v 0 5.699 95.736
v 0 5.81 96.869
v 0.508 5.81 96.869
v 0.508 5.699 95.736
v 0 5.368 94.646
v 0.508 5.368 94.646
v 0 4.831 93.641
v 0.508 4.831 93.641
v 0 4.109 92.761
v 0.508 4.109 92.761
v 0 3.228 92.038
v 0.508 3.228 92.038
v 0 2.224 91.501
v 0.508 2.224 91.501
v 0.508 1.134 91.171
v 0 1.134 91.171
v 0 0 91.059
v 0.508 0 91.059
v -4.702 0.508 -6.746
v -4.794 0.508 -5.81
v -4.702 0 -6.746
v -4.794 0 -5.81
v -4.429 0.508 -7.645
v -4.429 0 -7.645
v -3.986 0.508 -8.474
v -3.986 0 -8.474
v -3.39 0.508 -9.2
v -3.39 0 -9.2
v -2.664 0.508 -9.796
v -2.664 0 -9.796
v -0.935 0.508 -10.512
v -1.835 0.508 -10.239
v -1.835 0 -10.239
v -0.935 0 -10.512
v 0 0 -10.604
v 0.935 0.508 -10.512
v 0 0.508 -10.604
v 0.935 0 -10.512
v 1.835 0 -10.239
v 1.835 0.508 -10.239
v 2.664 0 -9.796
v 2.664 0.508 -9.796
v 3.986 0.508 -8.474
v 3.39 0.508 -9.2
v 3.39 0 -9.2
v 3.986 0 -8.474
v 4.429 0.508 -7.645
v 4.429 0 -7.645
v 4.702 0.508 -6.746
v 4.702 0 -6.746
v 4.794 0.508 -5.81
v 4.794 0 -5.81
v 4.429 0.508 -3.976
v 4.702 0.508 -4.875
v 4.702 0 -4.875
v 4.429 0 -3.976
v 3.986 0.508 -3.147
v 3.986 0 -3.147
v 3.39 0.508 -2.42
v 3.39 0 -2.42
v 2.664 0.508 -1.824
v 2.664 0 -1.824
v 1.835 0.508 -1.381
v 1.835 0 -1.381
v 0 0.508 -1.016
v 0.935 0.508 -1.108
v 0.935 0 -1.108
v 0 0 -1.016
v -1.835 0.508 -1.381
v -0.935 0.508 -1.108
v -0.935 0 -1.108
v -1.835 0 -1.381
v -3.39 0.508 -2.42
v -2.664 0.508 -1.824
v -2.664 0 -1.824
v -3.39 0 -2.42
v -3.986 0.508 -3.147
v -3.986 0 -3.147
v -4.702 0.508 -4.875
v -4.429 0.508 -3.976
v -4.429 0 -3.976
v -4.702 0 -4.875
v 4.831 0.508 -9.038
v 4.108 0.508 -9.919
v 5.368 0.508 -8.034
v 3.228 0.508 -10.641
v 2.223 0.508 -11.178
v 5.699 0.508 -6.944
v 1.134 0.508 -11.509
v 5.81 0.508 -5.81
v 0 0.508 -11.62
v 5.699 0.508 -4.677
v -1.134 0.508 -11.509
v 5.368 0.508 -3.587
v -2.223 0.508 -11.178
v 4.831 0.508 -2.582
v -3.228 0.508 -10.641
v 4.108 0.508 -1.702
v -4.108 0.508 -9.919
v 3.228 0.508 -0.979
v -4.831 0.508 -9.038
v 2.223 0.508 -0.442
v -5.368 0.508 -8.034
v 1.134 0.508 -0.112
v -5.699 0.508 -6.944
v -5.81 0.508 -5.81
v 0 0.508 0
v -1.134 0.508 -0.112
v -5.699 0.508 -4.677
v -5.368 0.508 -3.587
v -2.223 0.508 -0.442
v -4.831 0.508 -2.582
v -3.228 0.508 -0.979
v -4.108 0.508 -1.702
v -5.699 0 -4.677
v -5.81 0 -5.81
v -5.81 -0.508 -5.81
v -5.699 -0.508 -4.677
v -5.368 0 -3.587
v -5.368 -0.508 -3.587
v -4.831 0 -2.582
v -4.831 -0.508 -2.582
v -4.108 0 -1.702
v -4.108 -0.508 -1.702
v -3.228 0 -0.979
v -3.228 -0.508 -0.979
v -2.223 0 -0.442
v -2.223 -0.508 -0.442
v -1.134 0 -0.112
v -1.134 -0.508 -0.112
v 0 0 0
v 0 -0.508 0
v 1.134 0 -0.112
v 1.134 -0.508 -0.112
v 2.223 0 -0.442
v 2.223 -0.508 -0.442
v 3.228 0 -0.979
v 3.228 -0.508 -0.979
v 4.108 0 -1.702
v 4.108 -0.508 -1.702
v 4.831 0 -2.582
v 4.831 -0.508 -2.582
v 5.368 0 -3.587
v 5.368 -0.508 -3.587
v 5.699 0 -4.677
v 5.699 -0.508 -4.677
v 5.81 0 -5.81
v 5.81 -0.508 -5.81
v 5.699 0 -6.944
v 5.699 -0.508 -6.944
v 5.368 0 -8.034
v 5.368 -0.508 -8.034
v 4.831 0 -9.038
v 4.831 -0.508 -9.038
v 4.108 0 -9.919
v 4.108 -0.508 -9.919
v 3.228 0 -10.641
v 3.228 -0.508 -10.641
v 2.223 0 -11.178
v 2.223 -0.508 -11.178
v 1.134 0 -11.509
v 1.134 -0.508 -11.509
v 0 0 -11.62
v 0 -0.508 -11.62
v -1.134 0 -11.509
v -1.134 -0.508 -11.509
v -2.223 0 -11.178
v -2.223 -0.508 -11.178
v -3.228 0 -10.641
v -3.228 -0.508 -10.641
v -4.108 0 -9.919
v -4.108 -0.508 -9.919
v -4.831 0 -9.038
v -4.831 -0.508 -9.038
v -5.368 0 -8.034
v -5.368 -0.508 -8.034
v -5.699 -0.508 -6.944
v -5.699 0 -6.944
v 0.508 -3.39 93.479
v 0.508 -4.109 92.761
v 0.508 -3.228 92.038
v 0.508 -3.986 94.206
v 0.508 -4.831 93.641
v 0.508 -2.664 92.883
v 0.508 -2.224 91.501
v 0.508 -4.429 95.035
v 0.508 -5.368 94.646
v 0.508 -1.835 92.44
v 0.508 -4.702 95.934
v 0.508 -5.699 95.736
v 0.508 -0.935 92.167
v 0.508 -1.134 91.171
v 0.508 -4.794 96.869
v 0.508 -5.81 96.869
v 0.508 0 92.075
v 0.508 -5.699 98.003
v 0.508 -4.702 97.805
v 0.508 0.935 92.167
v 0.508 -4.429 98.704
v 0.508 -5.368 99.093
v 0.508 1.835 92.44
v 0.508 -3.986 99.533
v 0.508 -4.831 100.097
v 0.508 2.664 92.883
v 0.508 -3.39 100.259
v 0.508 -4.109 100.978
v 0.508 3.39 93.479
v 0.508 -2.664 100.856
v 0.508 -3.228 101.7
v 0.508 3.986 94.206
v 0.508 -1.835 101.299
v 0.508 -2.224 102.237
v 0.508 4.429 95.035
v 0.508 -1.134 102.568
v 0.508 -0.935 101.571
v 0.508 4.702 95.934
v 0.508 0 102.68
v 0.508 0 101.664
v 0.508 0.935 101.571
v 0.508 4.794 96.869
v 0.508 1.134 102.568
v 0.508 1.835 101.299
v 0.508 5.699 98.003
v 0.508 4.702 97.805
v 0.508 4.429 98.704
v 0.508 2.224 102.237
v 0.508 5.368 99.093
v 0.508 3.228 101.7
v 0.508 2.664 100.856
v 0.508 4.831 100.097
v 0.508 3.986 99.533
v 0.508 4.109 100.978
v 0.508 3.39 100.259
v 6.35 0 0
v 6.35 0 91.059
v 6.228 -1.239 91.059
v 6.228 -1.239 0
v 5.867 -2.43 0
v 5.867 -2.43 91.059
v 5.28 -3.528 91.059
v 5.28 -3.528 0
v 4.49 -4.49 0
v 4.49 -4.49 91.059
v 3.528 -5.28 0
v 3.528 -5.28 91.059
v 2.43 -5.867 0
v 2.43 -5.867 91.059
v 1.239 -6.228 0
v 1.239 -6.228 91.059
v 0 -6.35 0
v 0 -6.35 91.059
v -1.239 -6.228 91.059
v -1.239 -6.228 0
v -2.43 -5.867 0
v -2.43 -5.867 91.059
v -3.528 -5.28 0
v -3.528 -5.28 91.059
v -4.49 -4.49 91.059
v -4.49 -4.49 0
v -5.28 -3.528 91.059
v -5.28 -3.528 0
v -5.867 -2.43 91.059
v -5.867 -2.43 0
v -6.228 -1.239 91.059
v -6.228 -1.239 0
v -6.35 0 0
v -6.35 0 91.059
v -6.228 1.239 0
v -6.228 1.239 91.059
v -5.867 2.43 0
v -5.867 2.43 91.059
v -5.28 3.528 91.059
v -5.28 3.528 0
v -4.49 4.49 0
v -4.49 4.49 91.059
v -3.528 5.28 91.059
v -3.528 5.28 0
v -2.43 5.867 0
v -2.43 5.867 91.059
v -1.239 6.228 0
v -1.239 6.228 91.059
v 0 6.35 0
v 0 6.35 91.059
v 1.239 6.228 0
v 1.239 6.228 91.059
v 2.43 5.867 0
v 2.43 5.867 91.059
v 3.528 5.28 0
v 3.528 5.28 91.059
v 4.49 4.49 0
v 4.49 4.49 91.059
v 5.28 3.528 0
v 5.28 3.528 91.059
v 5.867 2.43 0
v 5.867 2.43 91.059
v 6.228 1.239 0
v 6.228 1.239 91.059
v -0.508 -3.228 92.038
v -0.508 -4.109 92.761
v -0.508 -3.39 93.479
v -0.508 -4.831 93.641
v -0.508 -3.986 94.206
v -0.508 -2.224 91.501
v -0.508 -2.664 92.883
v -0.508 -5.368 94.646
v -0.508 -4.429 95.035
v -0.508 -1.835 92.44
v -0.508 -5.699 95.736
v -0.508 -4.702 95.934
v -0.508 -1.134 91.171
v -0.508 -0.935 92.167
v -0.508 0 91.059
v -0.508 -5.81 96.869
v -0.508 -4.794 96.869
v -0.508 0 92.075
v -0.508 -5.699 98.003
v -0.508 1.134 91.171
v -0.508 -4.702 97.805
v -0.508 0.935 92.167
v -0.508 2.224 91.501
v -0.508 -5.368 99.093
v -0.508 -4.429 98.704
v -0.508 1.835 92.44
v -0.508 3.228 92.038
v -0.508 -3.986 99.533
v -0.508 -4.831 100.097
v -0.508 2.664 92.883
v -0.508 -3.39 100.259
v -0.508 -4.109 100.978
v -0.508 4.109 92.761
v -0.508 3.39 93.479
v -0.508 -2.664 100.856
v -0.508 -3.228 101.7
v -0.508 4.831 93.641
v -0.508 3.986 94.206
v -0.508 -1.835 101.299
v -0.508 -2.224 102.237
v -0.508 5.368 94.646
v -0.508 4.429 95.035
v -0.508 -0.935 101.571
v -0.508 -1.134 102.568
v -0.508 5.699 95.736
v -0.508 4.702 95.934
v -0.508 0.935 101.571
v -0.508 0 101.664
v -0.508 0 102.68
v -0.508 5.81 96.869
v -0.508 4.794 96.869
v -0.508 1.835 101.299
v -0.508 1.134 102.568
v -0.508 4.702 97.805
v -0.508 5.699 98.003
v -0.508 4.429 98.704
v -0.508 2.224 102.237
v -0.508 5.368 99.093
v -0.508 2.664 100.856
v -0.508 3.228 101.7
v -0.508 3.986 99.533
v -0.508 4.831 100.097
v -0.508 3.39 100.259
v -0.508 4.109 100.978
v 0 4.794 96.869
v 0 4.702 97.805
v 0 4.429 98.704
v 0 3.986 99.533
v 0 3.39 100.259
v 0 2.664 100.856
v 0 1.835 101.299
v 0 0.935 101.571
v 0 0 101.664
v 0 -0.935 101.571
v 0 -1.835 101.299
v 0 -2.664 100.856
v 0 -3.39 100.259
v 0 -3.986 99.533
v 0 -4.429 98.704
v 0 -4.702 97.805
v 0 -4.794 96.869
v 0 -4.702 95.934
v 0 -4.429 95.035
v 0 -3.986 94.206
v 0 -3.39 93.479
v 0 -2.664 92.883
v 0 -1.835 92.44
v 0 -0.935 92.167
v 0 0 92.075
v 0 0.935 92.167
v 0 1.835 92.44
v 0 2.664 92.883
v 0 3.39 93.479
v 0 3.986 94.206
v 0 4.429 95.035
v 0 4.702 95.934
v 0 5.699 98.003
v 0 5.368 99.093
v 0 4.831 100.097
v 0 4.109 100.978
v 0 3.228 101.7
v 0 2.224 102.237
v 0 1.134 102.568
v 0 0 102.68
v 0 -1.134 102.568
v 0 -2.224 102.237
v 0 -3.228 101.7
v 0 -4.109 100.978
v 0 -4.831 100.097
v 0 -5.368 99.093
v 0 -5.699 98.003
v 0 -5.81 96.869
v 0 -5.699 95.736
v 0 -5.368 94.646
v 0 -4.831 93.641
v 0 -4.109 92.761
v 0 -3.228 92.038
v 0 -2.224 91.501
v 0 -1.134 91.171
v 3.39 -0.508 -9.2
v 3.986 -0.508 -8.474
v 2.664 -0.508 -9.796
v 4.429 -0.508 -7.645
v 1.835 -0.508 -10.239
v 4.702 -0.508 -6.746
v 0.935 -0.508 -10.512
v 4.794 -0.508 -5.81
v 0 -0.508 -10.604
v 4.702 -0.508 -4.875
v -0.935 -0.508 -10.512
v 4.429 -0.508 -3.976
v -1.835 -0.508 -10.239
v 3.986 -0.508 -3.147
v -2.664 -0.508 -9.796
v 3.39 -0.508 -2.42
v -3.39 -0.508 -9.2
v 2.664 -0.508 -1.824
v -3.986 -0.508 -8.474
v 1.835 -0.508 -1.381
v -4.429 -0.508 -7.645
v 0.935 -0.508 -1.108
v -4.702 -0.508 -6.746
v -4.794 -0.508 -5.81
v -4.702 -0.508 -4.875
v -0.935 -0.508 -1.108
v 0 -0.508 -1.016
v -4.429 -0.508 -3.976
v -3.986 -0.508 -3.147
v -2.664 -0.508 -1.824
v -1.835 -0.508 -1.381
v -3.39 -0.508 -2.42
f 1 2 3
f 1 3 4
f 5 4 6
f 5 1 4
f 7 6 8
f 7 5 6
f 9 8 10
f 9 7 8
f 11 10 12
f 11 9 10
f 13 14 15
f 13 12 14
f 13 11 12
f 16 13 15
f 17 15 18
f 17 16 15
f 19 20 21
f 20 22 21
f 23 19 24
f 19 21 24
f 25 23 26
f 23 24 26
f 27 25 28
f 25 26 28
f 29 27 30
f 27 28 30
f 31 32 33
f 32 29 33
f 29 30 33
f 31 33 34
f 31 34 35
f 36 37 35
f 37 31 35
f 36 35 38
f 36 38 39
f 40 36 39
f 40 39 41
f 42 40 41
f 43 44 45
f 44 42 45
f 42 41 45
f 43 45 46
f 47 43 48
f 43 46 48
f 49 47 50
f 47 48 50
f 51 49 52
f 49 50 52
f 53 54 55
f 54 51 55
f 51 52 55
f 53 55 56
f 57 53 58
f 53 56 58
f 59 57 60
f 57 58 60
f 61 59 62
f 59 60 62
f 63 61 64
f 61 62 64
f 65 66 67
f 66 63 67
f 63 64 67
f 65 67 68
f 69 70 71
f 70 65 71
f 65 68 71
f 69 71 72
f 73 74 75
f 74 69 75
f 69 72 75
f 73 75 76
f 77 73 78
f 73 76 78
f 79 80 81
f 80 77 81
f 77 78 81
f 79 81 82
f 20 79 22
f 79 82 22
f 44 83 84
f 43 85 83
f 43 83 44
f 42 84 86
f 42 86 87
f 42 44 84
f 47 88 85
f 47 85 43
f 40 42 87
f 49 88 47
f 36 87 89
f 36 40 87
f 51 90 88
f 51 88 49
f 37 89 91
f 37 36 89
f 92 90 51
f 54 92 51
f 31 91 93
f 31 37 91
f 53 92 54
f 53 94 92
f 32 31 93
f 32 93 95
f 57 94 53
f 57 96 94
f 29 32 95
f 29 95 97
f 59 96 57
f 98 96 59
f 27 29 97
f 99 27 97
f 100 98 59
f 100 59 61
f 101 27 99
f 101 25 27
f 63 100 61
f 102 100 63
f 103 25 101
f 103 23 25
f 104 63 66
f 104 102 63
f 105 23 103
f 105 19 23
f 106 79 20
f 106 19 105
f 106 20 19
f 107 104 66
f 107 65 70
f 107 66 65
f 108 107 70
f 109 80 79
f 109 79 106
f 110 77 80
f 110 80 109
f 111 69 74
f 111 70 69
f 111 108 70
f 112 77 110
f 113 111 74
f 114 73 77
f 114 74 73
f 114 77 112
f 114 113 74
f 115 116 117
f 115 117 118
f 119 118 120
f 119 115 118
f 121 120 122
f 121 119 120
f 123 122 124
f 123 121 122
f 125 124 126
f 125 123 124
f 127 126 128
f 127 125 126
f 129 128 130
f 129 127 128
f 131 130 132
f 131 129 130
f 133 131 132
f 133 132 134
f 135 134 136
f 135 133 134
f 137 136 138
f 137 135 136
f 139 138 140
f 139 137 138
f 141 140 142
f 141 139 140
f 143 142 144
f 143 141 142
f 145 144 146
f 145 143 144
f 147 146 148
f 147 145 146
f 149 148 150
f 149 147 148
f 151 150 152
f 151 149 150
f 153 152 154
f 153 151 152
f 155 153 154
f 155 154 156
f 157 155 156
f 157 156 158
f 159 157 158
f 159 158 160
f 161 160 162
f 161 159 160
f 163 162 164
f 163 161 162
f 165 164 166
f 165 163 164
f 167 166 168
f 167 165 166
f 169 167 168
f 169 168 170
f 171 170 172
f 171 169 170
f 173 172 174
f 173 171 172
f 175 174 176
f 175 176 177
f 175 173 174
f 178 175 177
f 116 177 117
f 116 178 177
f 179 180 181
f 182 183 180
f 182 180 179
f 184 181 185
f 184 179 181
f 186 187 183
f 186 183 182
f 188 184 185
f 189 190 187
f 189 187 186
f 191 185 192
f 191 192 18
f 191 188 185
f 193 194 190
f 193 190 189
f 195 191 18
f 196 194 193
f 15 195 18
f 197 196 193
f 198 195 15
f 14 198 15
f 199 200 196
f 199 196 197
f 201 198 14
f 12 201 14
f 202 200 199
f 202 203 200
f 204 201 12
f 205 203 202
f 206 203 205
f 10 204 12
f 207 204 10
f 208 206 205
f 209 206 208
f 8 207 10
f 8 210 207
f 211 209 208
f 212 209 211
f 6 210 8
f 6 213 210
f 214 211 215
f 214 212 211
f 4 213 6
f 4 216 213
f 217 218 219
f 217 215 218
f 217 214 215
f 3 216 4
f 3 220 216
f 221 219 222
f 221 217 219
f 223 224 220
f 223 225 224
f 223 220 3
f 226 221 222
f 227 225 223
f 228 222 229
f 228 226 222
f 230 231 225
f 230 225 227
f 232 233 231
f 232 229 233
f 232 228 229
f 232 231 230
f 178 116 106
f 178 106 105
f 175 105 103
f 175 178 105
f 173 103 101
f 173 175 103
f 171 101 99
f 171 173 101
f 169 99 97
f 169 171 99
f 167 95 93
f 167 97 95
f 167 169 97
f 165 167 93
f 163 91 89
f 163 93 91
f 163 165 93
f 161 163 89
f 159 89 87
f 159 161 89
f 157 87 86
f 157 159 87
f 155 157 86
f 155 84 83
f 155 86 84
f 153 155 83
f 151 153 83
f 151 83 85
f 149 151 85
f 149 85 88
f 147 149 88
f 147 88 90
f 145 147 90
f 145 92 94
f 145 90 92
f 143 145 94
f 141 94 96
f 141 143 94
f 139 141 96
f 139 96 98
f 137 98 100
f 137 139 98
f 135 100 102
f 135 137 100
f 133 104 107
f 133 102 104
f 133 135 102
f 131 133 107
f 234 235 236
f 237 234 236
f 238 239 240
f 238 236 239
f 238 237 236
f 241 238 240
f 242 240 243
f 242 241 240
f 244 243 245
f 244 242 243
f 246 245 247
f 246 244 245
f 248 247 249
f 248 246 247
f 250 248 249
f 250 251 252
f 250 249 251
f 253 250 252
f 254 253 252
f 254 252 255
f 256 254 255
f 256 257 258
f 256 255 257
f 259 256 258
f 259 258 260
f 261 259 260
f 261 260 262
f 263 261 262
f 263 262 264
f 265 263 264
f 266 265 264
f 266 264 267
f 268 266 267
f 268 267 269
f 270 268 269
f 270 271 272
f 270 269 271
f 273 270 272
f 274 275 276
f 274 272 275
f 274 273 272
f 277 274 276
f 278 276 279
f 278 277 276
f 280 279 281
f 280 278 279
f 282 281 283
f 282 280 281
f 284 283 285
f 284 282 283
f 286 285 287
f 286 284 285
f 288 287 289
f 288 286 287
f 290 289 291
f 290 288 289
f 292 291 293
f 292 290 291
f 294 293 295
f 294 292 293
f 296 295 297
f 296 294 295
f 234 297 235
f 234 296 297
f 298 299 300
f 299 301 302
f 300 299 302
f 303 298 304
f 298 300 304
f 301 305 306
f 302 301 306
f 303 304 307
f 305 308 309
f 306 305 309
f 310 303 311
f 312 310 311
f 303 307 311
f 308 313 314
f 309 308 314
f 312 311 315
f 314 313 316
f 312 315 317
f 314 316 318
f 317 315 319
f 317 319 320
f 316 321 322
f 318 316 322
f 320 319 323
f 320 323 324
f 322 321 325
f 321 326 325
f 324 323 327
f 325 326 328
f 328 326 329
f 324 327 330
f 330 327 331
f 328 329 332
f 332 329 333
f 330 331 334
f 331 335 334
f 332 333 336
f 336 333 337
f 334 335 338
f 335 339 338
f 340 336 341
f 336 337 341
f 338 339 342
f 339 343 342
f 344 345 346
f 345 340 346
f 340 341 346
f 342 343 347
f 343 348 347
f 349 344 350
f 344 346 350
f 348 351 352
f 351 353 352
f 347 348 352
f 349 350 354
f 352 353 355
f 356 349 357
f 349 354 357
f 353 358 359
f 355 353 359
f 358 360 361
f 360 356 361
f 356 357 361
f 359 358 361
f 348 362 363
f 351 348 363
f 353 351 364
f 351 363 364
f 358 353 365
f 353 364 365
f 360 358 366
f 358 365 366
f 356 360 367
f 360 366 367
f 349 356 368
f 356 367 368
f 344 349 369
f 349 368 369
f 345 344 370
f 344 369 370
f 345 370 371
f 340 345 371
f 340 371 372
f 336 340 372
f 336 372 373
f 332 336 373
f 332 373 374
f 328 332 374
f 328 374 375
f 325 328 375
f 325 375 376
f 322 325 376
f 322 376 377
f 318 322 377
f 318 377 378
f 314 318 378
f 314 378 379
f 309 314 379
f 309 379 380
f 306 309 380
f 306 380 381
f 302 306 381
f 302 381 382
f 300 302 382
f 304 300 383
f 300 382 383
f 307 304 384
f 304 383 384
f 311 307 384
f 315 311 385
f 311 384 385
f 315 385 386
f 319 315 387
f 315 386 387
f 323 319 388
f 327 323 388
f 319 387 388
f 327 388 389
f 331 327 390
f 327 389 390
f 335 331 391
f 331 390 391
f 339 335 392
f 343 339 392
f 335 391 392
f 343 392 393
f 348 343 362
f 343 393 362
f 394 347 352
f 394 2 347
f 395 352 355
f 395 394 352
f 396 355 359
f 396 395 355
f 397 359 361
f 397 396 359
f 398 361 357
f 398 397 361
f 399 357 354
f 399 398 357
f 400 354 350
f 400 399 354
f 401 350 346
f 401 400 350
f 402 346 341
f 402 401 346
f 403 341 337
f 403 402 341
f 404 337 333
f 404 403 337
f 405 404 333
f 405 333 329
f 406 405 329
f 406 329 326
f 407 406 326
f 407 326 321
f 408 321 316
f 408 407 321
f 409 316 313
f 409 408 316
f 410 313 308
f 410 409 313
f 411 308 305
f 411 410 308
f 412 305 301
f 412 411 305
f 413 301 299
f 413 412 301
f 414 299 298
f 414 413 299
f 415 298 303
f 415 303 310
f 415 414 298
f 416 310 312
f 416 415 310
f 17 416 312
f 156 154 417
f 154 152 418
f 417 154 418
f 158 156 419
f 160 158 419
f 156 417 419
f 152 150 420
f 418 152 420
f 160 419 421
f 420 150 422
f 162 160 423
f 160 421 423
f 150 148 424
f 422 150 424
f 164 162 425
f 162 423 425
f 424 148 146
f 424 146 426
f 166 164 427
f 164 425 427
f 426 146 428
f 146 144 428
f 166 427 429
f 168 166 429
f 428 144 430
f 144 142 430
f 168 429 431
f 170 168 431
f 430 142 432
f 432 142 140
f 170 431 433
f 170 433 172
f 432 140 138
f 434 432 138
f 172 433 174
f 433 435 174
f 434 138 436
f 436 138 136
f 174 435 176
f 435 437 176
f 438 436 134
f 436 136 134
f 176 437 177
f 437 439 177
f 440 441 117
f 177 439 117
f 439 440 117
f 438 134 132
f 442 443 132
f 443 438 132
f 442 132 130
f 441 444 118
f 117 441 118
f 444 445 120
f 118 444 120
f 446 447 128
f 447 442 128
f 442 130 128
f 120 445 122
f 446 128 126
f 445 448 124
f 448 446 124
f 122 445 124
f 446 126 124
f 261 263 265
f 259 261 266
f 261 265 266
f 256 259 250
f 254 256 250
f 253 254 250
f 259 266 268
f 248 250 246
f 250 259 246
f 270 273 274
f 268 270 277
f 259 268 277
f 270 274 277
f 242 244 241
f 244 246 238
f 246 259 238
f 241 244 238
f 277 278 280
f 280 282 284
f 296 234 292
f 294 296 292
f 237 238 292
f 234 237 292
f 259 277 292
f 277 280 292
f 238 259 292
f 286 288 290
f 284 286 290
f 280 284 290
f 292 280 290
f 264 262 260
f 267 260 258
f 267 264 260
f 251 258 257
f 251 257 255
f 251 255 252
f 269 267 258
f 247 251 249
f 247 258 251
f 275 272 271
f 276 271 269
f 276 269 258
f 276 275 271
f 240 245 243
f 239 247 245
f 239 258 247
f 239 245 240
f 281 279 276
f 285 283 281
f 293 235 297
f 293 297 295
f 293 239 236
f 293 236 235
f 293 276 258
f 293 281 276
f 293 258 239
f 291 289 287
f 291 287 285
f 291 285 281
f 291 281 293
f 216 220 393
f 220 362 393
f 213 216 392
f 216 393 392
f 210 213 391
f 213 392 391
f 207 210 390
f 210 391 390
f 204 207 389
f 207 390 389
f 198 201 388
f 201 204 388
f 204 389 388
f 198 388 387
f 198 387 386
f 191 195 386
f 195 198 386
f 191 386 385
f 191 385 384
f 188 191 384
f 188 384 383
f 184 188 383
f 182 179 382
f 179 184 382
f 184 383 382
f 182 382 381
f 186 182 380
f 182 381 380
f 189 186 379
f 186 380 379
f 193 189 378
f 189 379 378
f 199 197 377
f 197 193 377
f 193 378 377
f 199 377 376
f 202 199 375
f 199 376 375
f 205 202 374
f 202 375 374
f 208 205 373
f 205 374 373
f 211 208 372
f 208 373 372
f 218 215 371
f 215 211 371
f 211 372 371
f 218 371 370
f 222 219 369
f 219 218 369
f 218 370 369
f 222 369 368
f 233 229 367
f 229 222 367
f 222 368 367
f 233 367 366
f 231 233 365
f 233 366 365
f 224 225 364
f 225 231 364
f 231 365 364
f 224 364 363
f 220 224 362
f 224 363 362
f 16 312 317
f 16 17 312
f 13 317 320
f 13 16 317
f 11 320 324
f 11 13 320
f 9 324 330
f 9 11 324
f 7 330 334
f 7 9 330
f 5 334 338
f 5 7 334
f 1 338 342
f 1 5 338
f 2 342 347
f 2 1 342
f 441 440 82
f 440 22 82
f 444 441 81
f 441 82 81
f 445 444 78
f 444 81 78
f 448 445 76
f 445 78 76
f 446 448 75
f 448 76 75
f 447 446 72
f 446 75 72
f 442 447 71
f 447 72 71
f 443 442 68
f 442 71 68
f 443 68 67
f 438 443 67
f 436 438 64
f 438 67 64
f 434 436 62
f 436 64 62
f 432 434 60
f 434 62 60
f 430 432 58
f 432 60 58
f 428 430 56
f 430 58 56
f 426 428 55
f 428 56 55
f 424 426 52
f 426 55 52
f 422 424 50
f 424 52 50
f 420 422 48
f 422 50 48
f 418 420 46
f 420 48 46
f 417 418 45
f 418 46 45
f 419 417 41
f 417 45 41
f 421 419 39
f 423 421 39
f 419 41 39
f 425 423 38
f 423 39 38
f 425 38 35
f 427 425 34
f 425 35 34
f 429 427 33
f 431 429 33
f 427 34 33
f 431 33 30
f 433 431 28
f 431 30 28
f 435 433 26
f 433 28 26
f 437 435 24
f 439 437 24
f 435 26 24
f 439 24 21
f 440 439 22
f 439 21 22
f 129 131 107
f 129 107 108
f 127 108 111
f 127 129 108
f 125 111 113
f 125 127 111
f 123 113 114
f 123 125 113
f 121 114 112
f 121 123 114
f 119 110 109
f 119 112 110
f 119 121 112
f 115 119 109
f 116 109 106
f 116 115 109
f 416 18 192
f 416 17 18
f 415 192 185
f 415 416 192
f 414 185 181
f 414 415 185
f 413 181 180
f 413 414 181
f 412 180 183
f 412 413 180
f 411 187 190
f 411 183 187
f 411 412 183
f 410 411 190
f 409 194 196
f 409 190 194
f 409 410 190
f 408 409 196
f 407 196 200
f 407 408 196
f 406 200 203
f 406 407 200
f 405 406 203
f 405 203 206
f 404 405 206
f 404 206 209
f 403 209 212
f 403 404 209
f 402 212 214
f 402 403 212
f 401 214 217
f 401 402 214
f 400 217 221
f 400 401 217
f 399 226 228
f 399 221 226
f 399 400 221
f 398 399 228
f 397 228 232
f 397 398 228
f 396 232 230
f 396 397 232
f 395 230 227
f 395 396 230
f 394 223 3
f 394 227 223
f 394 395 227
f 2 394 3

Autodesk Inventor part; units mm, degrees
ref_plane "YZ Plane" through (0, 0, 0) normal (1, 0, 0) x (0, 1, 0)
ref_plane "XZ Plane" through (0, 0, 0) normal (0, 1, 0) x (-1, 0, 0)
ref_plane "XY Plane" through (0, 0, 0) normal (0, 0, 1) x (1, 0, 0)
sketch "Sketch2" plane through (0, 0, 0) normal (0, 0, 1) x (1, 0, 0)
  circle A0 centre (0, 0) radius 6.35
  dimension "d0" = 12.7
extrude "Extrusion1" add sketch "Sketch2" along normal blind 91.059
sketch "Sketch3" plane through (0, 0, 0) normal (1, 0, 0) x (0, 1, 0)
  line L0 (6.35, 91.059) -> (-6.35, 91.059) construction
  line L1 (0, 91.059) -> (0, 96.8693) construction
  circle A0 centre (0, 96.8693) radius 5.8103
  circle A1 centre (0, 96.8693) radius 4.7943
  point P0 (0, 0)
  dimension "d3" = 5.8102
  dimension "d4" = 11.6205
  dimension "d5" = 1.016
extrude "Extrusion2" add sketch "Sketch3" along normal mid plane 1.016
sketch "Sketch4" plane through (0, 0, 0) normal (0, 1, 0) x (-1, 0, 0)
  line L0 (0, 0) -> (0, -5.8102) construction
  circle A0 centre (0, -5.8102) radius 5.8102
  circle A1 centre (0, -5.8102) radius 4.7942
  dimension "d8" = 5.8102
  dimension "d9" = 11.6205
  dimension "d10" = 1.016
extrude "Extrusion3" add sketch "Sketch4" along normal mid plane 1.016
properties part number "spring stand in"
